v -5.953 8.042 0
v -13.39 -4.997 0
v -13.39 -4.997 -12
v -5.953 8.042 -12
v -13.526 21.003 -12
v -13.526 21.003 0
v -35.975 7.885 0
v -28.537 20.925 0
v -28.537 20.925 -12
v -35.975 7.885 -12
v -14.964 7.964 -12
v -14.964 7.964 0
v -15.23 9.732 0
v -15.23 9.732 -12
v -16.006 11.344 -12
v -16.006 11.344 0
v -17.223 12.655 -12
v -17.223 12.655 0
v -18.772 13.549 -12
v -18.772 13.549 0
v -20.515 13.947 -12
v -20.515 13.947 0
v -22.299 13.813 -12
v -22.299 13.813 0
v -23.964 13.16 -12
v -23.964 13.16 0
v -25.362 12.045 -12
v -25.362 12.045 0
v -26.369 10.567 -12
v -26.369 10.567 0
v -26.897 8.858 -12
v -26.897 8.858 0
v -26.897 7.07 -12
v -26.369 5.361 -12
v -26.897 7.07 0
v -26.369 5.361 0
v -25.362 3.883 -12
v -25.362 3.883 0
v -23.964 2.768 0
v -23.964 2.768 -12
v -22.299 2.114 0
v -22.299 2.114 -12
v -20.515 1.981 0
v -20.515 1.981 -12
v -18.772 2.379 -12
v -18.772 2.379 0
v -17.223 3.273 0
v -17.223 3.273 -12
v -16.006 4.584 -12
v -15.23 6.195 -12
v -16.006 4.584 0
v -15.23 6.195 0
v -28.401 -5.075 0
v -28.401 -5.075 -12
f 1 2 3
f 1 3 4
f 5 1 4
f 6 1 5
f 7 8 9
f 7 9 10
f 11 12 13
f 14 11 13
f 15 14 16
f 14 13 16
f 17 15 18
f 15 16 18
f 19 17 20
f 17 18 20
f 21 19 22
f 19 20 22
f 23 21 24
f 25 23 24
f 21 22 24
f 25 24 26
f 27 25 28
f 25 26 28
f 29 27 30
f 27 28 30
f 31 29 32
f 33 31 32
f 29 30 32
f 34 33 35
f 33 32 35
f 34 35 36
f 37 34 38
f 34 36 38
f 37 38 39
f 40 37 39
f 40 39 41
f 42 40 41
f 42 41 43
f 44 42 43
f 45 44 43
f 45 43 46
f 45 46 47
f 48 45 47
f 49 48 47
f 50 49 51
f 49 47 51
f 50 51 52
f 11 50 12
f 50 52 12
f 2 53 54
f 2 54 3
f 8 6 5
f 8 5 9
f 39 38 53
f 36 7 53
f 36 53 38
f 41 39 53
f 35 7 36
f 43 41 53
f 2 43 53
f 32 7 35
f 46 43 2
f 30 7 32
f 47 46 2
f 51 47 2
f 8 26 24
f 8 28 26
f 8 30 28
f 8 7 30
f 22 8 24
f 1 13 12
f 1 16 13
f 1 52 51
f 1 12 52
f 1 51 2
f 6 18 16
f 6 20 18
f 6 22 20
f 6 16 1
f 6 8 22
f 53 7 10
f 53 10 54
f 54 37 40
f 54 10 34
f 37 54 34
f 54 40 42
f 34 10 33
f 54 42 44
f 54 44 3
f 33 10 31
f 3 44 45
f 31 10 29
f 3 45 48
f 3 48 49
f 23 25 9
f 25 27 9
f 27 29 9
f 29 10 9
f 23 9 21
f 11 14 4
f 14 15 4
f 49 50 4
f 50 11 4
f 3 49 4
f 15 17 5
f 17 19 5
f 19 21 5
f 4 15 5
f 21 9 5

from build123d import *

# Parameters (mm, degrees)
SKETCH1_R           = 6
BOSS_EXTRUDE1_DEPTH = 12


with BuildPart() as part:
    # Sketch1 → Boss-Extrude1 (new body)
    with BuildSketch(Plane.XY):
        Polygon((-13.390210882, -4.996930009), (-5.952575928, 8.042282782), (-13.526047972, 21.003069991), (-28.537154971, 20.924644411), (-35.974789926, 7.885431621), (-28.401317881, -5.075355589), align=None)
        with Locations((-20.963682927, 7.963857201)):
            Circle(SKETCH1_R, mode=Mode.SUBTRACT)
    extrude(amount=-BOSS_EXTRUDE1_DEPTH)


solid = part.part
